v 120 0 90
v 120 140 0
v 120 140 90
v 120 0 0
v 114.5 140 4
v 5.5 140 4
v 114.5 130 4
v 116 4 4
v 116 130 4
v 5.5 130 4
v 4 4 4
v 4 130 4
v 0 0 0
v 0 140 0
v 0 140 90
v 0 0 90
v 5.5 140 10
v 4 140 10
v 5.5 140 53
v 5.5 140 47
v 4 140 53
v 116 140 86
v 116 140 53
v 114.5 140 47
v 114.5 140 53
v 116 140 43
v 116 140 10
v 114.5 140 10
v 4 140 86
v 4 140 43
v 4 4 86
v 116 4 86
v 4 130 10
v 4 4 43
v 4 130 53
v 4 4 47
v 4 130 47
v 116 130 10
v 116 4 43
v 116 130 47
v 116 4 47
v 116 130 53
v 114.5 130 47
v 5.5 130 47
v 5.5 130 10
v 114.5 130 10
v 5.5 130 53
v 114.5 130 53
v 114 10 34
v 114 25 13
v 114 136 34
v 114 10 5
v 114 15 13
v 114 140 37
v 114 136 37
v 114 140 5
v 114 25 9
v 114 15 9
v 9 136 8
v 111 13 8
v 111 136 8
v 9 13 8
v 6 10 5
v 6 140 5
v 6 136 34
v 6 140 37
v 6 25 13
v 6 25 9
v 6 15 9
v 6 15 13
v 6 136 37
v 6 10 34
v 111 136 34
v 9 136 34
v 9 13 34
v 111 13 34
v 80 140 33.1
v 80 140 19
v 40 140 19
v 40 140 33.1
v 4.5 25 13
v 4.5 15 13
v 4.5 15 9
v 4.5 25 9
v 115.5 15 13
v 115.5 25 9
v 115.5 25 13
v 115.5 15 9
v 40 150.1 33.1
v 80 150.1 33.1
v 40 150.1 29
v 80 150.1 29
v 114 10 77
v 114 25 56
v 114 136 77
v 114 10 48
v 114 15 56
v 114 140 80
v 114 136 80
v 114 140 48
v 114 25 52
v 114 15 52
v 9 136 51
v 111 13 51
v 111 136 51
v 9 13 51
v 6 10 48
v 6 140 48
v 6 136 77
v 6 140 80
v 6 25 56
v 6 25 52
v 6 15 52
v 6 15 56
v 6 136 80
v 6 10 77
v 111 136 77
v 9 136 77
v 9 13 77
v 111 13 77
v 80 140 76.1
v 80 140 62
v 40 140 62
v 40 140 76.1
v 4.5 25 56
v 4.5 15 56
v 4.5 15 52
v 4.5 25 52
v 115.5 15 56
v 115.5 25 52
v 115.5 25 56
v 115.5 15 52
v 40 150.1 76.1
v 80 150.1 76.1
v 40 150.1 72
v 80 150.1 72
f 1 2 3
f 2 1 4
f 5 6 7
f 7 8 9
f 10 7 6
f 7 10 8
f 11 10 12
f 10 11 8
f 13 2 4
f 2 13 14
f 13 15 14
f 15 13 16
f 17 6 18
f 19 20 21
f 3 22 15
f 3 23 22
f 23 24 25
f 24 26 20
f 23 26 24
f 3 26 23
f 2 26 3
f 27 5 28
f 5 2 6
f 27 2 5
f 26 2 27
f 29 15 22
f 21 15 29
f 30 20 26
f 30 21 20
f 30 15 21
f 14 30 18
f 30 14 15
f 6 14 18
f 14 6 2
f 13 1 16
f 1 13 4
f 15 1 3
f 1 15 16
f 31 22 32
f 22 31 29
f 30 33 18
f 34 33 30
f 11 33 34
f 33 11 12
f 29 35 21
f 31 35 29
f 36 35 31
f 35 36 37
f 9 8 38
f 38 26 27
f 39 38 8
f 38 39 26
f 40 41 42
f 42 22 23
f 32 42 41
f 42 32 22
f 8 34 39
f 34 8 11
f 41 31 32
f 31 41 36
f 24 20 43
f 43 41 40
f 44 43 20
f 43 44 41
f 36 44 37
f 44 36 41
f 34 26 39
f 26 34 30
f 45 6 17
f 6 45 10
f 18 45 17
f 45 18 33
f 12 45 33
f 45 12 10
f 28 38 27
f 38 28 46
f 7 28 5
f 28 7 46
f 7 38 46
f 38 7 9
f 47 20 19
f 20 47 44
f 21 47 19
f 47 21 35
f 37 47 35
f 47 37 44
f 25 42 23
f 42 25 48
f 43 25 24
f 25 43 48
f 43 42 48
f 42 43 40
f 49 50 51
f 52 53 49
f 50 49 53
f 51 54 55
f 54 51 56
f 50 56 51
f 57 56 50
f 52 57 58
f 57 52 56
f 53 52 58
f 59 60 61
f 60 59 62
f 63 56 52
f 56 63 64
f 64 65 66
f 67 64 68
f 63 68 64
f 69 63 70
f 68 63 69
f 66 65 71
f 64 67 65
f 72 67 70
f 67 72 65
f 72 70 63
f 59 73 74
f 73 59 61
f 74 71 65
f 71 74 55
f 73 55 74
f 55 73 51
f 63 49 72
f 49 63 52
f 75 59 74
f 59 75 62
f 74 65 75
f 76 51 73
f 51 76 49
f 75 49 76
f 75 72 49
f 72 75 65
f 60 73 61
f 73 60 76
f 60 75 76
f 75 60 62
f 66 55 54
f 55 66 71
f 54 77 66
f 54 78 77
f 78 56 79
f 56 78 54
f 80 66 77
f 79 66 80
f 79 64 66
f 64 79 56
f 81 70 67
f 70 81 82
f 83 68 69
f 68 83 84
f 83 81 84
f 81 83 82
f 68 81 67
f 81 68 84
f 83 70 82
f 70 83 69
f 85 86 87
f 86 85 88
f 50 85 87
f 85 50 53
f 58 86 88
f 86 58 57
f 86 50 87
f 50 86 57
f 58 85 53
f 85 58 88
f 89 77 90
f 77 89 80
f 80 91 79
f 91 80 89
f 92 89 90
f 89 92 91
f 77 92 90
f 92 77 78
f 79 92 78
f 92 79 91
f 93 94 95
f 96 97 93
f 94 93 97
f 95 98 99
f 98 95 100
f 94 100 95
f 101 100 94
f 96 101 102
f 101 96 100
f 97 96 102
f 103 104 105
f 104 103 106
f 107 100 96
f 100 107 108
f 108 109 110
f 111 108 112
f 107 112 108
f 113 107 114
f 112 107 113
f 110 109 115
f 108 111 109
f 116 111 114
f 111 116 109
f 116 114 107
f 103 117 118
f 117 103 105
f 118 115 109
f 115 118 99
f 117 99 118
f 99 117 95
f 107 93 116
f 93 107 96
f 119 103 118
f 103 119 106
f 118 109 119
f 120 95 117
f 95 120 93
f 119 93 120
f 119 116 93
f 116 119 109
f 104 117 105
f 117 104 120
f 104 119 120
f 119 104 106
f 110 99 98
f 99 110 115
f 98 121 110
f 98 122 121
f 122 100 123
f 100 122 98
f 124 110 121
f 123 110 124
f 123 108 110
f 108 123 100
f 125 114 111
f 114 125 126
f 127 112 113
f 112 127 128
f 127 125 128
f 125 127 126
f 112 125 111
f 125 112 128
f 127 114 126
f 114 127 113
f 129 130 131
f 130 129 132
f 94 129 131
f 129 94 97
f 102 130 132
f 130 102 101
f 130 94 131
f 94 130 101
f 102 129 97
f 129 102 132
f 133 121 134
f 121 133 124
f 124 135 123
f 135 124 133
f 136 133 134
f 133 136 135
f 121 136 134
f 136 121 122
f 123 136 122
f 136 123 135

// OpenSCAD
cadverify_only = "";
module instance(name, part, unit = 1) {
    echo(cadverify_instance = [name, part, unit]);
    if (cadverify_only == "" || cadverify_only == name) children();
}

part = "assembly";

// ---------- parameters (mm) ----------
W = 120; Df = 140; H = 90; t = 4;
DW = 108; DDbox = 126; frontT = 4; pullP = 10; DH = 32;

// frame assembly geometry (assembly coords: x 0..120, y 0..140 back->front, z 0..90)
module frame_asm() {
    union() {
        // bottom
        cube([120, 140, 4]);
        // top
        translate([0, 0, 86]) cube([120, 140, 4]);
        // left wall
        cube([4, 140, 90]);
        // right wall
        translate([116, 0, 0]) cube([4, 140, 90]);
        // back wall
        cube([120, 4, 90]);
        // middle shelf (between side walls, from back to front)
        translate([4, 0, 43]) cube([112, 140, 4]);
        // stop blocks: overlap into walls/floors by 0.1 for manifold union
        // lower left
        translate([3.9, 130, 3.9]) cube([1.6, 10, 6.1]);
        // lower right
        translate([114.5, 130, 3.9]) cube([1.6, 10, 6.1]);
        // upper left (on middle shelf)
        translate([3.9, 130, 46.9]) cube([1.6, 10, 6.1]);
        // upper right
        translate([114.5, 130, 46.9]) cube([1.6, 10, 6.1]);
    }
}

// drawer local geometry (local coords: box min at 0,0,0; x 0..108, y 0..130 box+front, pull to 140, z 0..32, tabs to x -1.5..109.5)
module drawer_local() {
    union() {
        // bottom
        cube([108, 126, 3]);
        // left wall
        translate([0, 0, 3]) cube([3, 126, 26]);
        // right wall
        translate([105, 0, 3]) cube([3, 126, 26]);
        // back wall
        translate([0, 0, 3]) cube([108, 3, 26]);
        // front panel (full height)
        translate([0, 126, 0]) cube([108, 4, 32]);
        // stop tabs (overlap 0.5 into side walls)
        translate([-1.5, 5, 4]) cube([2.0, 10, 4]);
        translate([107.5, 5, 4]) cube([2.0, 10, 4]);
        // pull wedge: convex hull of 4 bars along X at YZ corners
        hull() {
            translate([34, 129.9, 14]) cube([40, 0.1, 0.1]);
            translate([34, 129.9, 28]) cube([40, 0.1, 0.1]);
            translate([34, 140, 24]) cube([40, 0.1, 0.1]);
            translate([34, 140, 28]) cube([40, 0.1, 0.1]);
        }
    }
}

module frame_print() {
    translate([0, 90, 0]) rotate([90, 0, 0]) frame_asm();
}
module drawer_print() {
    drawer_local();
}

if (part == "frame") {
    echo(cadverify_spec = [
        ["bounds", [[0, 0, 0], [120, 90, 140]]],
        ["bodies", 1],
        ["through_holes", 0],
        ["support_faces", [["bed", "-z", 5000]]],
        ["overhangs_allowed", [
            ["lower_left_block", [[3.5, 79, 129], [6, 87, 141]]],
            ["lower_right_block", [[114, 79, 129], [117, 87, 141]]],
            ["upper_left_block", [[3.5, 36, 129], [6, 44, 141]]],
            ["upper_right_block", [[114, 36, 129], [117, 44, 141]]]
        ]],
        ["copies", 1],
        ["details", [
            ["side_wall", "thickness", [-1, 45, 70], [1, 0, 0], 4],
            ["back_plate", "thickness", [60, 45, -1], [0, 0, 1], 4],
            ["block_ll", "material", [[4, 80, 130], [5.5, 86, 140]], 0.9],
            ["block_lr", "material", [[114.5, 80, 130], [116, 86, 140]], 0.9],
            ["block_ul", "material", [[4, 37, 130], [5.5, 43, 140]], 0.9],
            ["block_ur", "material", [[114.5, 37, 130], [116, 43, 140]], 0.9],
            ["cavity_lower", "void", [[6, 47, 4], [114, 86, 129]], 0.9],
            ["cavity_upper", "void", [[6, 4, 4], [114, 43, 129]], 0.9]
        ]]
    ]);
    frame_print();
} else if (part == "drawer") {
    echo(cadverify_spec = [
        ["bounds", [[-1.5, 0, 0], [109.5, 140, 32]]],
        ["bodies", 1],
        ["through_holes", 0],
        ["support_faces", [["bed", "-z", 5000]]],
        ["overhangs_allowed", [
            ["tab_left", [[-2, 4, 3], [1, 16, 9]]],
            ["tab_right", [[107, 4, 3], [111, 16, 9]]],
            ["pull_underside", [[33, 129, 13], [75, 141, 29]]]
        ]],
        ["copies", 2],
        ["details", [
            ["bottom", "thickness", [54, 60, -1], [0, 0, 1], 3],
            ["side_wall", "thickness", [-1, 60, 15], [1, 0, 0], 3],
            ["tab_left", "material", [[-1.5, 5, 4], [0.5, 15, 8]], 0.9],
            ["tab_right", "material", [[107.5, 5, 4], [109.5, 15, 8]], 0.9],
            ["interior", "void", [[4, 4, 4], [104, 125, 28]], 0.9],
            ["pull", "view", [[34, 129, 14], [74, 140, 28]]]
        ]]
    ]);
    drawer_print();
} else if (part == "assembly") {
    echo(cadverify_spec = [
        ["bounds", [[0, 0, 0], [120, 150, 90]]],
        ["support_faces", [["desk", "-z", 5000]]],
        ["allowed_interferences", []],
        ["motions", [
            ["lower_slide", ["drawer_lower"], "slide", [0, 1, 0], [0, 104]],
            ["upper_slide", ["drawer_upper"], "slide", [0, 1, 0], [0, 104]]
        ]],
        ["assembly_order", [
            [["frame"], [0, 0, 0]],
            [["drawer_lower"], [0, -1, -0.03]],
            [["drawer_upper"], [0, -1, -0.03]]
        ]]
    ]);
    instance("frame", "frame") frame_asm();
    instance("drawer_lower", "drawer", 1) translate([6, 10, 5]) drawer_local();
    instance("drawer_upper", "drawer", 1) translate([6, 10, 48]) drawer_local();
}
